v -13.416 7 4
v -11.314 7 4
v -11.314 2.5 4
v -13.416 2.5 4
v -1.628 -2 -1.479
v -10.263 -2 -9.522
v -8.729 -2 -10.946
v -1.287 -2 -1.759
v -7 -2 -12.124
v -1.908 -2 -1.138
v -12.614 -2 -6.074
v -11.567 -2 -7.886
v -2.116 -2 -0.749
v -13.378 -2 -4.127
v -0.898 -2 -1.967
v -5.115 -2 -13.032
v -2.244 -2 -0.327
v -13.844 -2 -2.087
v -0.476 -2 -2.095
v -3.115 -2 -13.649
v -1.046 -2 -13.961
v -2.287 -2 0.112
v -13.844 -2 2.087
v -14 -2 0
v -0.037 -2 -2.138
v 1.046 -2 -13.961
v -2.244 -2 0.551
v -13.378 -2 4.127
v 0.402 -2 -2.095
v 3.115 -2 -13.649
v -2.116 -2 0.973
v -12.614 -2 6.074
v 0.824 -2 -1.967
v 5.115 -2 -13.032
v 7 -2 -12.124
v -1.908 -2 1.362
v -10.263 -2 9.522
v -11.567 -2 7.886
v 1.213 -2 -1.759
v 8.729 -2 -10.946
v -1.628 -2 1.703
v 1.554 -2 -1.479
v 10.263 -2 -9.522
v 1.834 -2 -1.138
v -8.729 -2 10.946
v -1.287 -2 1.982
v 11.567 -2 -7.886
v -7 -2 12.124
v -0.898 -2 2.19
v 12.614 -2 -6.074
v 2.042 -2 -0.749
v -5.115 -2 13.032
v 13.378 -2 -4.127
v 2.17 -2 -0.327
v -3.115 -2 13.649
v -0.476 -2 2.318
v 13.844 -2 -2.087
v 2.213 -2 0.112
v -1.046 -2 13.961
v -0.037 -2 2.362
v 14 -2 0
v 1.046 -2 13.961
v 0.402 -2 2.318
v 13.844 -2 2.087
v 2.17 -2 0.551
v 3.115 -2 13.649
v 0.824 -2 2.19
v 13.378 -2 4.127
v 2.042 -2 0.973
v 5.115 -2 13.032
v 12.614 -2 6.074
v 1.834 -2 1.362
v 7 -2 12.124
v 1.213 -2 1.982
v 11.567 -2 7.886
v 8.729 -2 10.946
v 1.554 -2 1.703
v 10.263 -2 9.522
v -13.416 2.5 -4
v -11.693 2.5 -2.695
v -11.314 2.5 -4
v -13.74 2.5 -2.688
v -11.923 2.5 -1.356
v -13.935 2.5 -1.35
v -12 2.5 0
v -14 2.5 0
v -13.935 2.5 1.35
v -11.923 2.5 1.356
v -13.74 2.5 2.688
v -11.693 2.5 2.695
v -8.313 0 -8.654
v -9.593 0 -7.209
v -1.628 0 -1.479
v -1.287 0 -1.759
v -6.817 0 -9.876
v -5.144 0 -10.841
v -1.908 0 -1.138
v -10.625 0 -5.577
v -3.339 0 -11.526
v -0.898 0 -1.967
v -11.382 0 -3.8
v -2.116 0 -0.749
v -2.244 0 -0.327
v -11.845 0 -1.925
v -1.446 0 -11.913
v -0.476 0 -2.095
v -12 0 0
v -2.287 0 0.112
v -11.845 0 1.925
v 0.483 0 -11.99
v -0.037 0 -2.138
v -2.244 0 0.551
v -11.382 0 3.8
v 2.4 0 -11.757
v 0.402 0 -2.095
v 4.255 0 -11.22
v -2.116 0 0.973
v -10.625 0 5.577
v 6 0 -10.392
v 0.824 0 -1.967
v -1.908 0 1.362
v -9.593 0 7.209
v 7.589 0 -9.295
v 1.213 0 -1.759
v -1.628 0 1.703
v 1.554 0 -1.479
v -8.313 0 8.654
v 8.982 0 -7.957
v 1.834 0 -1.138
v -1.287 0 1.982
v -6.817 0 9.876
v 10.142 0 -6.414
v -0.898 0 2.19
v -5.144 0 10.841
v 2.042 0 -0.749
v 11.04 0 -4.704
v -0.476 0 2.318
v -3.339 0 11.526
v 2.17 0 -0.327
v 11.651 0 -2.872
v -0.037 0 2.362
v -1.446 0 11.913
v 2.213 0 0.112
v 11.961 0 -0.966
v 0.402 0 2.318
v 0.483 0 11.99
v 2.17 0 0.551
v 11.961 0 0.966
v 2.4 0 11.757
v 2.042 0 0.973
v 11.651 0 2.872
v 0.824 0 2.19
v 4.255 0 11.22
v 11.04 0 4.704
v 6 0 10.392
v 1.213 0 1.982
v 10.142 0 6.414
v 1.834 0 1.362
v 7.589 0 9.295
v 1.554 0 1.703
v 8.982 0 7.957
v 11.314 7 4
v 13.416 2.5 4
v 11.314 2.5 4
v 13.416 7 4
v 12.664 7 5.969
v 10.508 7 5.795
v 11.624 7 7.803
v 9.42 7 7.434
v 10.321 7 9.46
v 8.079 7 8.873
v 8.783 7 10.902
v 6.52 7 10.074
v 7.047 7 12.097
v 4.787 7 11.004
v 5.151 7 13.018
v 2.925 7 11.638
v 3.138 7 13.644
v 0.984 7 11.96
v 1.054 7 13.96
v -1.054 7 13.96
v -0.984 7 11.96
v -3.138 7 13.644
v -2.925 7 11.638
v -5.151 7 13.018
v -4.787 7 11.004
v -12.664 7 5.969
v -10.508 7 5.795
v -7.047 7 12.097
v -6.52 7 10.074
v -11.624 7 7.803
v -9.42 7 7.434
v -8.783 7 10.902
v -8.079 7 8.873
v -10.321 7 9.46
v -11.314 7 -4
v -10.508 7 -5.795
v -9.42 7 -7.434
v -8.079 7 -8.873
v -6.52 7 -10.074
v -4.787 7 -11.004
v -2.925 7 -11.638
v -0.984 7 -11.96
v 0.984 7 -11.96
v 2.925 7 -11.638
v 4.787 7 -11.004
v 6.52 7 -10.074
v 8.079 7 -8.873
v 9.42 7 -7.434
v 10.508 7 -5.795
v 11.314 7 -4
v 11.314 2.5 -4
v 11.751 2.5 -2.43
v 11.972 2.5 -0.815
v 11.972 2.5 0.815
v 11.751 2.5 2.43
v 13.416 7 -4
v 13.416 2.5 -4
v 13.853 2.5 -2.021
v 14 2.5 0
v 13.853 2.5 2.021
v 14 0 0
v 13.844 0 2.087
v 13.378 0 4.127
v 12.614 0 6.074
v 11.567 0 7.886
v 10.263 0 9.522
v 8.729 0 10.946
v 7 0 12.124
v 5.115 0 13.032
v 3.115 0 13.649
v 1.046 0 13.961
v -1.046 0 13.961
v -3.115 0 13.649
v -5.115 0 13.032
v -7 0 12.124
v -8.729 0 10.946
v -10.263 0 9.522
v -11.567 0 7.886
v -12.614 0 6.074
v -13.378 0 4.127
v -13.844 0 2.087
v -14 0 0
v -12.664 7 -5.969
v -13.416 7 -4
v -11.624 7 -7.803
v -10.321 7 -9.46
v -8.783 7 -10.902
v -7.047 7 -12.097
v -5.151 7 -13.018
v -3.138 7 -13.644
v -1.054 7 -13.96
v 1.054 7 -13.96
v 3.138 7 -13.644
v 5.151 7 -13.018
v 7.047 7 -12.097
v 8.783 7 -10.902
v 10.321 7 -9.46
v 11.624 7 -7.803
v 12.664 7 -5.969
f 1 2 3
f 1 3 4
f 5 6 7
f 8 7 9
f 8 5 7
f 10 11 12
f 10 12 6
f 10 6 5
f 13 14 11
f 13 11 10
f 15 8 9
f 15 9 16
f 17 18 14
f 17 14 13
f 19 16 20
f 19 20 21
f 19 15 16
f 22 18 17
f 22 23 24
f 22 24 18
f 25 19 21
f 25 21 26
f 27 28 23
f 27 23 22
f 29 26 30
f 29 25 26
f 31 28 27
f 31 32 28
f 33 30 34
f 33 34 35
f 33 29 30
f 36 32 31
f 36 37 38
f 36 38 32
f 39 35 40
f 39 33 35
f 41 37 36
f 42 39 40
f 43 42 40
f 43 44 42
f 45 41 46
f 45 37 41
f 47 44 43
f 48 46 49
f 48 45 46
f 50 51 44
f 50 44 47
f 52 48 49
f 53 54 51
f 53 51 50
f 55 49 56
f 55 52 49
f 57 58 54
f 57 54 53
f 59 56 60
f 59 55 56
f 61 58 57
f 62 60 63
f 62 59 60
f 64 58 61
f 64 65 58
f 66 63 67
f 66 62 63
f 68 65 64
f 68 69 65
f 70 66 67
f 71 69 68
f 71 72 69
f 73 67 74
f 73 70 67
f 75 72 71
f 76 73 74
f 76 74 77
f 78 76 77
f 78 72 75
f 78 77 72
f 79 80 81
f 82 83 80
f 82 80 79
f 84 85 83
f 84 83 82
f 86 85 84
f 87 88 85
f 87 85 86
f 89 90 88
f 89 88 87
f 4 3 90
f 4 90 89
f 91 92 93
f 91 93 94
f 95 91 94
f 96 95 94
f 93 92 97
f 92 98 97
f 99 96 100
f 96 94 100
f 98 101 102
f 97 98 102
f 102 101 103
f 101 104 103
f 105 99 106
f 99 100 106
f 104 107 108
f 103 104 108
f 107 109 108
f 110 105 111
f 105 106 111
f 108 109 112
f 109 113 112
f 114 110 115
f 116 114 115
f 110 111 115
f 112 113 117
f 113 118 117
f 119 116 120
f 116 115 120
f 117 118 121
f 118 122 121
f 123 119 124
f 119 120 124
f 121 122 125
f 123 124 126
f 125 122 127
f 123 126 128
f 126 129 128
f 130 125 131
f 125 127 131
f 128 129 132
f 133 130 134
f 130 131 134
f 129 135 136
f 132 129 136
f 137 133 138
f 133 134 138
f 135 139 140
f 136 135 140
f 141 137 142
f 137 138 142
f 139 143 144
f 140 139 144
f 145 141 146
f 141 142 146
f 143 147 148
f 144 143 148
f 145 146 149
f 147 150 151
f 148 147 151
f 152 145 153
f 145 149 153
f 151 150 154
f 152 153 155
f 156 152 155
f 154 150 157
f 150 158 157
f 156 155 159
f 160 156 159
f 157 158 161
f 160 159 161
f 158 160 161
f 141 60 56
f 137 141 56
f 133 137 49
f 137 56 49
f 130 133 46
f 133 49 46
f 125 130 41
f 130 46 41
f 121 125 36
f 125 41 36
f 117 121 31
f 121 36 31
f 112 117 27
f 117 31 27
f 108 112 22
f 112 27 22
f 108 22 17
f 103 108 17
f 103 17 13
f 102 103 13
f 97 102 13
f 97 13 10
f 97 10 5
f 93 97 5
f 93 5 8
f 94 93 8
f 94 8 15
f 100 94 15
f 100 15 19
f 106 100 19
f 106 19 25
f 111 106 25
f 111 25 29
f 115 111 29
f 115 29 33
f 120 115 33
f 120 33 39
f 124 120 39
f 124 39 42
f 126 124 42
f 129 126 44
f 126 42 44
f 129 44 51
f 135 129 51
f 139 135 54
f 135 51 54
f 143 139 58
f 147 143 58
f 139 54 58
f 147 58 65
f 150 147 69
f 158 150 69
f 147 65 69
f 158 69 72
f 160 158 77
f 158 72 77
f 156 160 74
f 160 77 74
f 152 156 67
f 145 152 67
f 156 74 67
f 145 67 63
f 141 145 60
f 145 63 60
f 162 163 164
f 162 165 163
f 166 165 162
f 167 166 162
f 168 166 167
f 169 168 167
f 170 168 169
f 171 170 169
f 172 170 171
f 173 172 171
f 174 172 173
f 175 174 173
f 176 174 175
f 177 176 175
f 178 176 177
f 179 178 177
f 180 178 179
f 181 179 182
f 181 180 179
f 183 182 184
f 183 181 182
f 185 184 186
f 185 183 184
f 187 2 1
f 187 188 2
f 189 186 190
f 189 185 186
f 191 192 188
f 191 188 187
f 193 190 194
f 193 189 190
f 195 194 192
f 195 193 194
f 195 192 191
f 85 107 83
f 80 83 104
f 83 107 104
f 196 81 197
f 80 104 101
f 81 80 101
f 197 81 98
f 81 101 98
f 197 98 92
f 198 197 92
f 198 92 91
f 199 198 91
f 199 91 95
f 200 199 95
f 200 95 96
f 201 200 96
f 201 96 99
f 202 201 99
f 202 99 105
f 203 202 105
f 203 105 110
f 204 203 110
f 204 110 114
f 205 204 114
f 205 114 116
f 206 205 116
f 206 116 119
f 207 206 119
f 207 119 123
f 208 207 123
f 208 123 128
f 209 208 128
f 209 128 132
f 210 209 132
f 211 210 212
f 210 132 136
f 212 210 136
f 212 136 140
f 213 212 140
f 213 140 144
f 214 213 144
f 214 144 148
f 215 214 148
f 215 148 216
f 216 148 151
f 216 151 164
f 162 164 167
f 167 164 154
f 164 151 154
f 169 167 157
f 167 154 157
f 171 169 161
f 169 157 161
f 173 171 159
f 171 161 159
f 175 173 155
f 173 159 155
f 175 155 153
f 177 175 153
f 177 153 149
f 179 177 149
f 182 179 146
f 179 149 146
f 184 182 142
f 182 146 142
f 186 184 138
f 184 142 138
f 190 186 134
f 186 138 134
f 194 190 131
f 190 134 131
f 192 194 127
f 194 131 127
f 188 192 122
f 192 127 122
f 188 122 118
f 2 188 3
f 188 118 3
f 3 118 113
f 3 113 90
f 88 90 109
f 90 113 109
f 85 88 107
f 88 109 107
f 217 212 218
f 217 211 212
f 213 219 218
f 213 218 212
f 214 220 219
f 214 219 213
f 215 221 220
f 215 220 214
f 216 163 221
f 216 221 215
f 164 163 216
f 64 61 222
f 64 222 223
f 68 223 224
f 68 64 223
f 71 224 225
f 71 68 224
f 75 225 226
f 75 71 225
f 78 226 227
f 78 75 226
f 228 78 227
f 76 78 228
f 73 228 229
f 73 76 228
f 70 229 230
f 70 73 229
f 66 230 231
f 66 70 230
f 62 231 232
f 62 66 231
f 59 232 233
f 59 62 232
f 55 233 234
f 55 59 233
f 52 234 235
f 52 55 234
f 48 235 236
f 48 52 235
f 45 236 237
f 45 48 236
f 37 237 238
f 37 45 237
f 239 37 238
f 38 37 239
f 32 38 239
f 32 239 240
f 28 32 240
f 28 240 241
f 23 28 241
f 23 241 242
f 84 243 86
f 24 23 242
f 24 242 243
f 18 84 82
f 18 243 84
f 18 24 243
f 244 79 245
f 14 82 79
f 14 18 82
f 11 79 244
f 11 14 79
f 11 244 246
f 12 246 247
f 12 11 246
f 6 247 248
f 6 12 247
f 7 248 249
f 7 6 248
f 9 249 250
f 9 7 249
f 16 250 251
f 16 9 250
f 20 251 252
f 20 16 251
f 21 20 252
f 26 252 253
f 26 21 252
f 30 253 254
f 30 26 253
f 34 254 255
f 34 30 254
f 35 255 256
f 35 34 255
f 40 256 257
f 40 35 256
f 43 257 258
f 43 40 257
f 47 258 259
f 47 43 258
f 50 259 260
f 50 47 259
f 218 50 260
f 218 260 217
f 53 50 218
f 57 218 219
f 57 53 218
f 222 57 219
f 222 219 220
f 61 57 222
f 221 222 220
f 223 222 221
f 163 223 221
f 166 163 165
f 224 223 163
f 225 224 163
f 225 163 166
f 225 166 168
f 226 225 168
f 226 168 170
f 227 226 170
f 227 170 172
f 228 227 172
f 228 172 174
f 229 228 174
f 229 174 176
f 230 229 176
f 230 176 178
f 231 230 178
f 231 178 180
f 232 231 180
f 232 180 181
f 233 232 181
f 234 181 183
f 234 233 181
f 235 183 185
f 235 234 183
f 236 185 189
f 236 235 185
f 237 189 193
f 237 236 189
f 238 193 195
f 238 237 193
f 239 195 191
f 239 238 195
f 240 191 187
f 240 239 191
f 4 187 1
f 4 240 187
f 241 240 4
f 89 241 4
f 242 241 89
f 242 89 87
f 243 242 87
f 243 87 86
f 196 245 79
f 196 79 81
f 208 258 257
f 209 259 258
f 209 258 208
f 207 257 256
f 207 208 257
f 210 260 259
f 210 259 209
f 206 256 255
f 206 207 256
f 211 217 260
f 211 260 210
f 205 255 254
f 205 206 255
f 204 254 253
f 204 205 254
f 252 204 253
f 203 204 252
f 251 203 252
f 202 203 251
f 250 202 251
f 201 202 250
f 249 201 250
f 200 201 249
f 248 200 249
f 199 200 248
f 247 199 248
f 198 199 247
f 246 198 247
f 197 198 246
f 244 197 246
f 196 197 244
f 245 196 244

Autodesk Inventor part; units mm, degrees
ref_plane "YZ Plane" through (0, 0, 0) normal (1, 0, 0) x (0, 1, 0)
ref_plane "XZ Plane" through (0, 0, 0) normal (0, 1, 0) x (-1, 0, 0)
ref_plane "XY Plane" through (0, 0, 0) normal (0, 0, 1) x (1, 0, 0)
sketch "Sketch1" plane through (0, 0, 0) normal (0, 1, 0) x (-1, 0, 0)
  circle A0 centre (0, 0) radius 14
  circle A1 centre (0, 0) radius 12
  dimension "d0" = 28
  dimension "d1" = 24
extrude "Extrusion1" add sketch "Sketch1" along normal blind 7
sketch "Sketch2" plane through (0, 7, 0) normal (0, 1, 0) x (1, 0, 0)
  line L0 (14, -4) -> (-14, -4)
  line L1 (-14, -4) -> (-14, 4)
  line L2 (-14, 4) -> (14, 4)
  line L3 (14, 4) -> (14, -4)
  line L4 (14, -4) -> (-14, 4) construction
  line L5 (-14, -4) -> (14, 4) construction
  line L6 (-0.5, 5) -> (0.5, 5)
  line L7 (0.5, 5) -> (0.5, -5)
  line L8 (0.5, -5) -> (-0.5, -5)
  line L9 (-0.5, -5) -> (-0.5, 5)
  line L10 (-0.5, 5) -> (0.5, -5) construction
  line L11 (0.5, 5) -> (-0.5, -5) construction
  point P0 (0, 0)
  dimension "d4" = 28
  dimension "d5" = 8
extrude "Extrusion2" cut sketch "Sketch2" against normal blind 8 contours L0 L7 L2 L3 | L0 L9 L2 L7 | L0 L1 L2 L9
sketch "Sketch3" plane through (0, 0, 0) normal (0, -1, 0) x (1, 0, 0)
  circle A0 centre (0, 0) radius 14
  dimension "d17" = 28
extrude "Extrusion3" add sketch "Sketch3" along normal blind 2
sketch "Sketch5" plane through (0, 0, 0) normal (0, 1, 0) x (1, 0, 0)
  point P0 (0, 0)
  point P1 (-0.0372, -0.1116)
hole "Hole2" at (-0.0372, 0, 0.1116) direction (0, -1, 0) diameter 4.5 end through all clearance for "Hex Head Machine Screw" size "M4" standard "Ansi Metric M Profile"
extrude "Extrusion4" add sketch "Sketch1" along normal blind 2.5
properties part number "magneticslotV1"
